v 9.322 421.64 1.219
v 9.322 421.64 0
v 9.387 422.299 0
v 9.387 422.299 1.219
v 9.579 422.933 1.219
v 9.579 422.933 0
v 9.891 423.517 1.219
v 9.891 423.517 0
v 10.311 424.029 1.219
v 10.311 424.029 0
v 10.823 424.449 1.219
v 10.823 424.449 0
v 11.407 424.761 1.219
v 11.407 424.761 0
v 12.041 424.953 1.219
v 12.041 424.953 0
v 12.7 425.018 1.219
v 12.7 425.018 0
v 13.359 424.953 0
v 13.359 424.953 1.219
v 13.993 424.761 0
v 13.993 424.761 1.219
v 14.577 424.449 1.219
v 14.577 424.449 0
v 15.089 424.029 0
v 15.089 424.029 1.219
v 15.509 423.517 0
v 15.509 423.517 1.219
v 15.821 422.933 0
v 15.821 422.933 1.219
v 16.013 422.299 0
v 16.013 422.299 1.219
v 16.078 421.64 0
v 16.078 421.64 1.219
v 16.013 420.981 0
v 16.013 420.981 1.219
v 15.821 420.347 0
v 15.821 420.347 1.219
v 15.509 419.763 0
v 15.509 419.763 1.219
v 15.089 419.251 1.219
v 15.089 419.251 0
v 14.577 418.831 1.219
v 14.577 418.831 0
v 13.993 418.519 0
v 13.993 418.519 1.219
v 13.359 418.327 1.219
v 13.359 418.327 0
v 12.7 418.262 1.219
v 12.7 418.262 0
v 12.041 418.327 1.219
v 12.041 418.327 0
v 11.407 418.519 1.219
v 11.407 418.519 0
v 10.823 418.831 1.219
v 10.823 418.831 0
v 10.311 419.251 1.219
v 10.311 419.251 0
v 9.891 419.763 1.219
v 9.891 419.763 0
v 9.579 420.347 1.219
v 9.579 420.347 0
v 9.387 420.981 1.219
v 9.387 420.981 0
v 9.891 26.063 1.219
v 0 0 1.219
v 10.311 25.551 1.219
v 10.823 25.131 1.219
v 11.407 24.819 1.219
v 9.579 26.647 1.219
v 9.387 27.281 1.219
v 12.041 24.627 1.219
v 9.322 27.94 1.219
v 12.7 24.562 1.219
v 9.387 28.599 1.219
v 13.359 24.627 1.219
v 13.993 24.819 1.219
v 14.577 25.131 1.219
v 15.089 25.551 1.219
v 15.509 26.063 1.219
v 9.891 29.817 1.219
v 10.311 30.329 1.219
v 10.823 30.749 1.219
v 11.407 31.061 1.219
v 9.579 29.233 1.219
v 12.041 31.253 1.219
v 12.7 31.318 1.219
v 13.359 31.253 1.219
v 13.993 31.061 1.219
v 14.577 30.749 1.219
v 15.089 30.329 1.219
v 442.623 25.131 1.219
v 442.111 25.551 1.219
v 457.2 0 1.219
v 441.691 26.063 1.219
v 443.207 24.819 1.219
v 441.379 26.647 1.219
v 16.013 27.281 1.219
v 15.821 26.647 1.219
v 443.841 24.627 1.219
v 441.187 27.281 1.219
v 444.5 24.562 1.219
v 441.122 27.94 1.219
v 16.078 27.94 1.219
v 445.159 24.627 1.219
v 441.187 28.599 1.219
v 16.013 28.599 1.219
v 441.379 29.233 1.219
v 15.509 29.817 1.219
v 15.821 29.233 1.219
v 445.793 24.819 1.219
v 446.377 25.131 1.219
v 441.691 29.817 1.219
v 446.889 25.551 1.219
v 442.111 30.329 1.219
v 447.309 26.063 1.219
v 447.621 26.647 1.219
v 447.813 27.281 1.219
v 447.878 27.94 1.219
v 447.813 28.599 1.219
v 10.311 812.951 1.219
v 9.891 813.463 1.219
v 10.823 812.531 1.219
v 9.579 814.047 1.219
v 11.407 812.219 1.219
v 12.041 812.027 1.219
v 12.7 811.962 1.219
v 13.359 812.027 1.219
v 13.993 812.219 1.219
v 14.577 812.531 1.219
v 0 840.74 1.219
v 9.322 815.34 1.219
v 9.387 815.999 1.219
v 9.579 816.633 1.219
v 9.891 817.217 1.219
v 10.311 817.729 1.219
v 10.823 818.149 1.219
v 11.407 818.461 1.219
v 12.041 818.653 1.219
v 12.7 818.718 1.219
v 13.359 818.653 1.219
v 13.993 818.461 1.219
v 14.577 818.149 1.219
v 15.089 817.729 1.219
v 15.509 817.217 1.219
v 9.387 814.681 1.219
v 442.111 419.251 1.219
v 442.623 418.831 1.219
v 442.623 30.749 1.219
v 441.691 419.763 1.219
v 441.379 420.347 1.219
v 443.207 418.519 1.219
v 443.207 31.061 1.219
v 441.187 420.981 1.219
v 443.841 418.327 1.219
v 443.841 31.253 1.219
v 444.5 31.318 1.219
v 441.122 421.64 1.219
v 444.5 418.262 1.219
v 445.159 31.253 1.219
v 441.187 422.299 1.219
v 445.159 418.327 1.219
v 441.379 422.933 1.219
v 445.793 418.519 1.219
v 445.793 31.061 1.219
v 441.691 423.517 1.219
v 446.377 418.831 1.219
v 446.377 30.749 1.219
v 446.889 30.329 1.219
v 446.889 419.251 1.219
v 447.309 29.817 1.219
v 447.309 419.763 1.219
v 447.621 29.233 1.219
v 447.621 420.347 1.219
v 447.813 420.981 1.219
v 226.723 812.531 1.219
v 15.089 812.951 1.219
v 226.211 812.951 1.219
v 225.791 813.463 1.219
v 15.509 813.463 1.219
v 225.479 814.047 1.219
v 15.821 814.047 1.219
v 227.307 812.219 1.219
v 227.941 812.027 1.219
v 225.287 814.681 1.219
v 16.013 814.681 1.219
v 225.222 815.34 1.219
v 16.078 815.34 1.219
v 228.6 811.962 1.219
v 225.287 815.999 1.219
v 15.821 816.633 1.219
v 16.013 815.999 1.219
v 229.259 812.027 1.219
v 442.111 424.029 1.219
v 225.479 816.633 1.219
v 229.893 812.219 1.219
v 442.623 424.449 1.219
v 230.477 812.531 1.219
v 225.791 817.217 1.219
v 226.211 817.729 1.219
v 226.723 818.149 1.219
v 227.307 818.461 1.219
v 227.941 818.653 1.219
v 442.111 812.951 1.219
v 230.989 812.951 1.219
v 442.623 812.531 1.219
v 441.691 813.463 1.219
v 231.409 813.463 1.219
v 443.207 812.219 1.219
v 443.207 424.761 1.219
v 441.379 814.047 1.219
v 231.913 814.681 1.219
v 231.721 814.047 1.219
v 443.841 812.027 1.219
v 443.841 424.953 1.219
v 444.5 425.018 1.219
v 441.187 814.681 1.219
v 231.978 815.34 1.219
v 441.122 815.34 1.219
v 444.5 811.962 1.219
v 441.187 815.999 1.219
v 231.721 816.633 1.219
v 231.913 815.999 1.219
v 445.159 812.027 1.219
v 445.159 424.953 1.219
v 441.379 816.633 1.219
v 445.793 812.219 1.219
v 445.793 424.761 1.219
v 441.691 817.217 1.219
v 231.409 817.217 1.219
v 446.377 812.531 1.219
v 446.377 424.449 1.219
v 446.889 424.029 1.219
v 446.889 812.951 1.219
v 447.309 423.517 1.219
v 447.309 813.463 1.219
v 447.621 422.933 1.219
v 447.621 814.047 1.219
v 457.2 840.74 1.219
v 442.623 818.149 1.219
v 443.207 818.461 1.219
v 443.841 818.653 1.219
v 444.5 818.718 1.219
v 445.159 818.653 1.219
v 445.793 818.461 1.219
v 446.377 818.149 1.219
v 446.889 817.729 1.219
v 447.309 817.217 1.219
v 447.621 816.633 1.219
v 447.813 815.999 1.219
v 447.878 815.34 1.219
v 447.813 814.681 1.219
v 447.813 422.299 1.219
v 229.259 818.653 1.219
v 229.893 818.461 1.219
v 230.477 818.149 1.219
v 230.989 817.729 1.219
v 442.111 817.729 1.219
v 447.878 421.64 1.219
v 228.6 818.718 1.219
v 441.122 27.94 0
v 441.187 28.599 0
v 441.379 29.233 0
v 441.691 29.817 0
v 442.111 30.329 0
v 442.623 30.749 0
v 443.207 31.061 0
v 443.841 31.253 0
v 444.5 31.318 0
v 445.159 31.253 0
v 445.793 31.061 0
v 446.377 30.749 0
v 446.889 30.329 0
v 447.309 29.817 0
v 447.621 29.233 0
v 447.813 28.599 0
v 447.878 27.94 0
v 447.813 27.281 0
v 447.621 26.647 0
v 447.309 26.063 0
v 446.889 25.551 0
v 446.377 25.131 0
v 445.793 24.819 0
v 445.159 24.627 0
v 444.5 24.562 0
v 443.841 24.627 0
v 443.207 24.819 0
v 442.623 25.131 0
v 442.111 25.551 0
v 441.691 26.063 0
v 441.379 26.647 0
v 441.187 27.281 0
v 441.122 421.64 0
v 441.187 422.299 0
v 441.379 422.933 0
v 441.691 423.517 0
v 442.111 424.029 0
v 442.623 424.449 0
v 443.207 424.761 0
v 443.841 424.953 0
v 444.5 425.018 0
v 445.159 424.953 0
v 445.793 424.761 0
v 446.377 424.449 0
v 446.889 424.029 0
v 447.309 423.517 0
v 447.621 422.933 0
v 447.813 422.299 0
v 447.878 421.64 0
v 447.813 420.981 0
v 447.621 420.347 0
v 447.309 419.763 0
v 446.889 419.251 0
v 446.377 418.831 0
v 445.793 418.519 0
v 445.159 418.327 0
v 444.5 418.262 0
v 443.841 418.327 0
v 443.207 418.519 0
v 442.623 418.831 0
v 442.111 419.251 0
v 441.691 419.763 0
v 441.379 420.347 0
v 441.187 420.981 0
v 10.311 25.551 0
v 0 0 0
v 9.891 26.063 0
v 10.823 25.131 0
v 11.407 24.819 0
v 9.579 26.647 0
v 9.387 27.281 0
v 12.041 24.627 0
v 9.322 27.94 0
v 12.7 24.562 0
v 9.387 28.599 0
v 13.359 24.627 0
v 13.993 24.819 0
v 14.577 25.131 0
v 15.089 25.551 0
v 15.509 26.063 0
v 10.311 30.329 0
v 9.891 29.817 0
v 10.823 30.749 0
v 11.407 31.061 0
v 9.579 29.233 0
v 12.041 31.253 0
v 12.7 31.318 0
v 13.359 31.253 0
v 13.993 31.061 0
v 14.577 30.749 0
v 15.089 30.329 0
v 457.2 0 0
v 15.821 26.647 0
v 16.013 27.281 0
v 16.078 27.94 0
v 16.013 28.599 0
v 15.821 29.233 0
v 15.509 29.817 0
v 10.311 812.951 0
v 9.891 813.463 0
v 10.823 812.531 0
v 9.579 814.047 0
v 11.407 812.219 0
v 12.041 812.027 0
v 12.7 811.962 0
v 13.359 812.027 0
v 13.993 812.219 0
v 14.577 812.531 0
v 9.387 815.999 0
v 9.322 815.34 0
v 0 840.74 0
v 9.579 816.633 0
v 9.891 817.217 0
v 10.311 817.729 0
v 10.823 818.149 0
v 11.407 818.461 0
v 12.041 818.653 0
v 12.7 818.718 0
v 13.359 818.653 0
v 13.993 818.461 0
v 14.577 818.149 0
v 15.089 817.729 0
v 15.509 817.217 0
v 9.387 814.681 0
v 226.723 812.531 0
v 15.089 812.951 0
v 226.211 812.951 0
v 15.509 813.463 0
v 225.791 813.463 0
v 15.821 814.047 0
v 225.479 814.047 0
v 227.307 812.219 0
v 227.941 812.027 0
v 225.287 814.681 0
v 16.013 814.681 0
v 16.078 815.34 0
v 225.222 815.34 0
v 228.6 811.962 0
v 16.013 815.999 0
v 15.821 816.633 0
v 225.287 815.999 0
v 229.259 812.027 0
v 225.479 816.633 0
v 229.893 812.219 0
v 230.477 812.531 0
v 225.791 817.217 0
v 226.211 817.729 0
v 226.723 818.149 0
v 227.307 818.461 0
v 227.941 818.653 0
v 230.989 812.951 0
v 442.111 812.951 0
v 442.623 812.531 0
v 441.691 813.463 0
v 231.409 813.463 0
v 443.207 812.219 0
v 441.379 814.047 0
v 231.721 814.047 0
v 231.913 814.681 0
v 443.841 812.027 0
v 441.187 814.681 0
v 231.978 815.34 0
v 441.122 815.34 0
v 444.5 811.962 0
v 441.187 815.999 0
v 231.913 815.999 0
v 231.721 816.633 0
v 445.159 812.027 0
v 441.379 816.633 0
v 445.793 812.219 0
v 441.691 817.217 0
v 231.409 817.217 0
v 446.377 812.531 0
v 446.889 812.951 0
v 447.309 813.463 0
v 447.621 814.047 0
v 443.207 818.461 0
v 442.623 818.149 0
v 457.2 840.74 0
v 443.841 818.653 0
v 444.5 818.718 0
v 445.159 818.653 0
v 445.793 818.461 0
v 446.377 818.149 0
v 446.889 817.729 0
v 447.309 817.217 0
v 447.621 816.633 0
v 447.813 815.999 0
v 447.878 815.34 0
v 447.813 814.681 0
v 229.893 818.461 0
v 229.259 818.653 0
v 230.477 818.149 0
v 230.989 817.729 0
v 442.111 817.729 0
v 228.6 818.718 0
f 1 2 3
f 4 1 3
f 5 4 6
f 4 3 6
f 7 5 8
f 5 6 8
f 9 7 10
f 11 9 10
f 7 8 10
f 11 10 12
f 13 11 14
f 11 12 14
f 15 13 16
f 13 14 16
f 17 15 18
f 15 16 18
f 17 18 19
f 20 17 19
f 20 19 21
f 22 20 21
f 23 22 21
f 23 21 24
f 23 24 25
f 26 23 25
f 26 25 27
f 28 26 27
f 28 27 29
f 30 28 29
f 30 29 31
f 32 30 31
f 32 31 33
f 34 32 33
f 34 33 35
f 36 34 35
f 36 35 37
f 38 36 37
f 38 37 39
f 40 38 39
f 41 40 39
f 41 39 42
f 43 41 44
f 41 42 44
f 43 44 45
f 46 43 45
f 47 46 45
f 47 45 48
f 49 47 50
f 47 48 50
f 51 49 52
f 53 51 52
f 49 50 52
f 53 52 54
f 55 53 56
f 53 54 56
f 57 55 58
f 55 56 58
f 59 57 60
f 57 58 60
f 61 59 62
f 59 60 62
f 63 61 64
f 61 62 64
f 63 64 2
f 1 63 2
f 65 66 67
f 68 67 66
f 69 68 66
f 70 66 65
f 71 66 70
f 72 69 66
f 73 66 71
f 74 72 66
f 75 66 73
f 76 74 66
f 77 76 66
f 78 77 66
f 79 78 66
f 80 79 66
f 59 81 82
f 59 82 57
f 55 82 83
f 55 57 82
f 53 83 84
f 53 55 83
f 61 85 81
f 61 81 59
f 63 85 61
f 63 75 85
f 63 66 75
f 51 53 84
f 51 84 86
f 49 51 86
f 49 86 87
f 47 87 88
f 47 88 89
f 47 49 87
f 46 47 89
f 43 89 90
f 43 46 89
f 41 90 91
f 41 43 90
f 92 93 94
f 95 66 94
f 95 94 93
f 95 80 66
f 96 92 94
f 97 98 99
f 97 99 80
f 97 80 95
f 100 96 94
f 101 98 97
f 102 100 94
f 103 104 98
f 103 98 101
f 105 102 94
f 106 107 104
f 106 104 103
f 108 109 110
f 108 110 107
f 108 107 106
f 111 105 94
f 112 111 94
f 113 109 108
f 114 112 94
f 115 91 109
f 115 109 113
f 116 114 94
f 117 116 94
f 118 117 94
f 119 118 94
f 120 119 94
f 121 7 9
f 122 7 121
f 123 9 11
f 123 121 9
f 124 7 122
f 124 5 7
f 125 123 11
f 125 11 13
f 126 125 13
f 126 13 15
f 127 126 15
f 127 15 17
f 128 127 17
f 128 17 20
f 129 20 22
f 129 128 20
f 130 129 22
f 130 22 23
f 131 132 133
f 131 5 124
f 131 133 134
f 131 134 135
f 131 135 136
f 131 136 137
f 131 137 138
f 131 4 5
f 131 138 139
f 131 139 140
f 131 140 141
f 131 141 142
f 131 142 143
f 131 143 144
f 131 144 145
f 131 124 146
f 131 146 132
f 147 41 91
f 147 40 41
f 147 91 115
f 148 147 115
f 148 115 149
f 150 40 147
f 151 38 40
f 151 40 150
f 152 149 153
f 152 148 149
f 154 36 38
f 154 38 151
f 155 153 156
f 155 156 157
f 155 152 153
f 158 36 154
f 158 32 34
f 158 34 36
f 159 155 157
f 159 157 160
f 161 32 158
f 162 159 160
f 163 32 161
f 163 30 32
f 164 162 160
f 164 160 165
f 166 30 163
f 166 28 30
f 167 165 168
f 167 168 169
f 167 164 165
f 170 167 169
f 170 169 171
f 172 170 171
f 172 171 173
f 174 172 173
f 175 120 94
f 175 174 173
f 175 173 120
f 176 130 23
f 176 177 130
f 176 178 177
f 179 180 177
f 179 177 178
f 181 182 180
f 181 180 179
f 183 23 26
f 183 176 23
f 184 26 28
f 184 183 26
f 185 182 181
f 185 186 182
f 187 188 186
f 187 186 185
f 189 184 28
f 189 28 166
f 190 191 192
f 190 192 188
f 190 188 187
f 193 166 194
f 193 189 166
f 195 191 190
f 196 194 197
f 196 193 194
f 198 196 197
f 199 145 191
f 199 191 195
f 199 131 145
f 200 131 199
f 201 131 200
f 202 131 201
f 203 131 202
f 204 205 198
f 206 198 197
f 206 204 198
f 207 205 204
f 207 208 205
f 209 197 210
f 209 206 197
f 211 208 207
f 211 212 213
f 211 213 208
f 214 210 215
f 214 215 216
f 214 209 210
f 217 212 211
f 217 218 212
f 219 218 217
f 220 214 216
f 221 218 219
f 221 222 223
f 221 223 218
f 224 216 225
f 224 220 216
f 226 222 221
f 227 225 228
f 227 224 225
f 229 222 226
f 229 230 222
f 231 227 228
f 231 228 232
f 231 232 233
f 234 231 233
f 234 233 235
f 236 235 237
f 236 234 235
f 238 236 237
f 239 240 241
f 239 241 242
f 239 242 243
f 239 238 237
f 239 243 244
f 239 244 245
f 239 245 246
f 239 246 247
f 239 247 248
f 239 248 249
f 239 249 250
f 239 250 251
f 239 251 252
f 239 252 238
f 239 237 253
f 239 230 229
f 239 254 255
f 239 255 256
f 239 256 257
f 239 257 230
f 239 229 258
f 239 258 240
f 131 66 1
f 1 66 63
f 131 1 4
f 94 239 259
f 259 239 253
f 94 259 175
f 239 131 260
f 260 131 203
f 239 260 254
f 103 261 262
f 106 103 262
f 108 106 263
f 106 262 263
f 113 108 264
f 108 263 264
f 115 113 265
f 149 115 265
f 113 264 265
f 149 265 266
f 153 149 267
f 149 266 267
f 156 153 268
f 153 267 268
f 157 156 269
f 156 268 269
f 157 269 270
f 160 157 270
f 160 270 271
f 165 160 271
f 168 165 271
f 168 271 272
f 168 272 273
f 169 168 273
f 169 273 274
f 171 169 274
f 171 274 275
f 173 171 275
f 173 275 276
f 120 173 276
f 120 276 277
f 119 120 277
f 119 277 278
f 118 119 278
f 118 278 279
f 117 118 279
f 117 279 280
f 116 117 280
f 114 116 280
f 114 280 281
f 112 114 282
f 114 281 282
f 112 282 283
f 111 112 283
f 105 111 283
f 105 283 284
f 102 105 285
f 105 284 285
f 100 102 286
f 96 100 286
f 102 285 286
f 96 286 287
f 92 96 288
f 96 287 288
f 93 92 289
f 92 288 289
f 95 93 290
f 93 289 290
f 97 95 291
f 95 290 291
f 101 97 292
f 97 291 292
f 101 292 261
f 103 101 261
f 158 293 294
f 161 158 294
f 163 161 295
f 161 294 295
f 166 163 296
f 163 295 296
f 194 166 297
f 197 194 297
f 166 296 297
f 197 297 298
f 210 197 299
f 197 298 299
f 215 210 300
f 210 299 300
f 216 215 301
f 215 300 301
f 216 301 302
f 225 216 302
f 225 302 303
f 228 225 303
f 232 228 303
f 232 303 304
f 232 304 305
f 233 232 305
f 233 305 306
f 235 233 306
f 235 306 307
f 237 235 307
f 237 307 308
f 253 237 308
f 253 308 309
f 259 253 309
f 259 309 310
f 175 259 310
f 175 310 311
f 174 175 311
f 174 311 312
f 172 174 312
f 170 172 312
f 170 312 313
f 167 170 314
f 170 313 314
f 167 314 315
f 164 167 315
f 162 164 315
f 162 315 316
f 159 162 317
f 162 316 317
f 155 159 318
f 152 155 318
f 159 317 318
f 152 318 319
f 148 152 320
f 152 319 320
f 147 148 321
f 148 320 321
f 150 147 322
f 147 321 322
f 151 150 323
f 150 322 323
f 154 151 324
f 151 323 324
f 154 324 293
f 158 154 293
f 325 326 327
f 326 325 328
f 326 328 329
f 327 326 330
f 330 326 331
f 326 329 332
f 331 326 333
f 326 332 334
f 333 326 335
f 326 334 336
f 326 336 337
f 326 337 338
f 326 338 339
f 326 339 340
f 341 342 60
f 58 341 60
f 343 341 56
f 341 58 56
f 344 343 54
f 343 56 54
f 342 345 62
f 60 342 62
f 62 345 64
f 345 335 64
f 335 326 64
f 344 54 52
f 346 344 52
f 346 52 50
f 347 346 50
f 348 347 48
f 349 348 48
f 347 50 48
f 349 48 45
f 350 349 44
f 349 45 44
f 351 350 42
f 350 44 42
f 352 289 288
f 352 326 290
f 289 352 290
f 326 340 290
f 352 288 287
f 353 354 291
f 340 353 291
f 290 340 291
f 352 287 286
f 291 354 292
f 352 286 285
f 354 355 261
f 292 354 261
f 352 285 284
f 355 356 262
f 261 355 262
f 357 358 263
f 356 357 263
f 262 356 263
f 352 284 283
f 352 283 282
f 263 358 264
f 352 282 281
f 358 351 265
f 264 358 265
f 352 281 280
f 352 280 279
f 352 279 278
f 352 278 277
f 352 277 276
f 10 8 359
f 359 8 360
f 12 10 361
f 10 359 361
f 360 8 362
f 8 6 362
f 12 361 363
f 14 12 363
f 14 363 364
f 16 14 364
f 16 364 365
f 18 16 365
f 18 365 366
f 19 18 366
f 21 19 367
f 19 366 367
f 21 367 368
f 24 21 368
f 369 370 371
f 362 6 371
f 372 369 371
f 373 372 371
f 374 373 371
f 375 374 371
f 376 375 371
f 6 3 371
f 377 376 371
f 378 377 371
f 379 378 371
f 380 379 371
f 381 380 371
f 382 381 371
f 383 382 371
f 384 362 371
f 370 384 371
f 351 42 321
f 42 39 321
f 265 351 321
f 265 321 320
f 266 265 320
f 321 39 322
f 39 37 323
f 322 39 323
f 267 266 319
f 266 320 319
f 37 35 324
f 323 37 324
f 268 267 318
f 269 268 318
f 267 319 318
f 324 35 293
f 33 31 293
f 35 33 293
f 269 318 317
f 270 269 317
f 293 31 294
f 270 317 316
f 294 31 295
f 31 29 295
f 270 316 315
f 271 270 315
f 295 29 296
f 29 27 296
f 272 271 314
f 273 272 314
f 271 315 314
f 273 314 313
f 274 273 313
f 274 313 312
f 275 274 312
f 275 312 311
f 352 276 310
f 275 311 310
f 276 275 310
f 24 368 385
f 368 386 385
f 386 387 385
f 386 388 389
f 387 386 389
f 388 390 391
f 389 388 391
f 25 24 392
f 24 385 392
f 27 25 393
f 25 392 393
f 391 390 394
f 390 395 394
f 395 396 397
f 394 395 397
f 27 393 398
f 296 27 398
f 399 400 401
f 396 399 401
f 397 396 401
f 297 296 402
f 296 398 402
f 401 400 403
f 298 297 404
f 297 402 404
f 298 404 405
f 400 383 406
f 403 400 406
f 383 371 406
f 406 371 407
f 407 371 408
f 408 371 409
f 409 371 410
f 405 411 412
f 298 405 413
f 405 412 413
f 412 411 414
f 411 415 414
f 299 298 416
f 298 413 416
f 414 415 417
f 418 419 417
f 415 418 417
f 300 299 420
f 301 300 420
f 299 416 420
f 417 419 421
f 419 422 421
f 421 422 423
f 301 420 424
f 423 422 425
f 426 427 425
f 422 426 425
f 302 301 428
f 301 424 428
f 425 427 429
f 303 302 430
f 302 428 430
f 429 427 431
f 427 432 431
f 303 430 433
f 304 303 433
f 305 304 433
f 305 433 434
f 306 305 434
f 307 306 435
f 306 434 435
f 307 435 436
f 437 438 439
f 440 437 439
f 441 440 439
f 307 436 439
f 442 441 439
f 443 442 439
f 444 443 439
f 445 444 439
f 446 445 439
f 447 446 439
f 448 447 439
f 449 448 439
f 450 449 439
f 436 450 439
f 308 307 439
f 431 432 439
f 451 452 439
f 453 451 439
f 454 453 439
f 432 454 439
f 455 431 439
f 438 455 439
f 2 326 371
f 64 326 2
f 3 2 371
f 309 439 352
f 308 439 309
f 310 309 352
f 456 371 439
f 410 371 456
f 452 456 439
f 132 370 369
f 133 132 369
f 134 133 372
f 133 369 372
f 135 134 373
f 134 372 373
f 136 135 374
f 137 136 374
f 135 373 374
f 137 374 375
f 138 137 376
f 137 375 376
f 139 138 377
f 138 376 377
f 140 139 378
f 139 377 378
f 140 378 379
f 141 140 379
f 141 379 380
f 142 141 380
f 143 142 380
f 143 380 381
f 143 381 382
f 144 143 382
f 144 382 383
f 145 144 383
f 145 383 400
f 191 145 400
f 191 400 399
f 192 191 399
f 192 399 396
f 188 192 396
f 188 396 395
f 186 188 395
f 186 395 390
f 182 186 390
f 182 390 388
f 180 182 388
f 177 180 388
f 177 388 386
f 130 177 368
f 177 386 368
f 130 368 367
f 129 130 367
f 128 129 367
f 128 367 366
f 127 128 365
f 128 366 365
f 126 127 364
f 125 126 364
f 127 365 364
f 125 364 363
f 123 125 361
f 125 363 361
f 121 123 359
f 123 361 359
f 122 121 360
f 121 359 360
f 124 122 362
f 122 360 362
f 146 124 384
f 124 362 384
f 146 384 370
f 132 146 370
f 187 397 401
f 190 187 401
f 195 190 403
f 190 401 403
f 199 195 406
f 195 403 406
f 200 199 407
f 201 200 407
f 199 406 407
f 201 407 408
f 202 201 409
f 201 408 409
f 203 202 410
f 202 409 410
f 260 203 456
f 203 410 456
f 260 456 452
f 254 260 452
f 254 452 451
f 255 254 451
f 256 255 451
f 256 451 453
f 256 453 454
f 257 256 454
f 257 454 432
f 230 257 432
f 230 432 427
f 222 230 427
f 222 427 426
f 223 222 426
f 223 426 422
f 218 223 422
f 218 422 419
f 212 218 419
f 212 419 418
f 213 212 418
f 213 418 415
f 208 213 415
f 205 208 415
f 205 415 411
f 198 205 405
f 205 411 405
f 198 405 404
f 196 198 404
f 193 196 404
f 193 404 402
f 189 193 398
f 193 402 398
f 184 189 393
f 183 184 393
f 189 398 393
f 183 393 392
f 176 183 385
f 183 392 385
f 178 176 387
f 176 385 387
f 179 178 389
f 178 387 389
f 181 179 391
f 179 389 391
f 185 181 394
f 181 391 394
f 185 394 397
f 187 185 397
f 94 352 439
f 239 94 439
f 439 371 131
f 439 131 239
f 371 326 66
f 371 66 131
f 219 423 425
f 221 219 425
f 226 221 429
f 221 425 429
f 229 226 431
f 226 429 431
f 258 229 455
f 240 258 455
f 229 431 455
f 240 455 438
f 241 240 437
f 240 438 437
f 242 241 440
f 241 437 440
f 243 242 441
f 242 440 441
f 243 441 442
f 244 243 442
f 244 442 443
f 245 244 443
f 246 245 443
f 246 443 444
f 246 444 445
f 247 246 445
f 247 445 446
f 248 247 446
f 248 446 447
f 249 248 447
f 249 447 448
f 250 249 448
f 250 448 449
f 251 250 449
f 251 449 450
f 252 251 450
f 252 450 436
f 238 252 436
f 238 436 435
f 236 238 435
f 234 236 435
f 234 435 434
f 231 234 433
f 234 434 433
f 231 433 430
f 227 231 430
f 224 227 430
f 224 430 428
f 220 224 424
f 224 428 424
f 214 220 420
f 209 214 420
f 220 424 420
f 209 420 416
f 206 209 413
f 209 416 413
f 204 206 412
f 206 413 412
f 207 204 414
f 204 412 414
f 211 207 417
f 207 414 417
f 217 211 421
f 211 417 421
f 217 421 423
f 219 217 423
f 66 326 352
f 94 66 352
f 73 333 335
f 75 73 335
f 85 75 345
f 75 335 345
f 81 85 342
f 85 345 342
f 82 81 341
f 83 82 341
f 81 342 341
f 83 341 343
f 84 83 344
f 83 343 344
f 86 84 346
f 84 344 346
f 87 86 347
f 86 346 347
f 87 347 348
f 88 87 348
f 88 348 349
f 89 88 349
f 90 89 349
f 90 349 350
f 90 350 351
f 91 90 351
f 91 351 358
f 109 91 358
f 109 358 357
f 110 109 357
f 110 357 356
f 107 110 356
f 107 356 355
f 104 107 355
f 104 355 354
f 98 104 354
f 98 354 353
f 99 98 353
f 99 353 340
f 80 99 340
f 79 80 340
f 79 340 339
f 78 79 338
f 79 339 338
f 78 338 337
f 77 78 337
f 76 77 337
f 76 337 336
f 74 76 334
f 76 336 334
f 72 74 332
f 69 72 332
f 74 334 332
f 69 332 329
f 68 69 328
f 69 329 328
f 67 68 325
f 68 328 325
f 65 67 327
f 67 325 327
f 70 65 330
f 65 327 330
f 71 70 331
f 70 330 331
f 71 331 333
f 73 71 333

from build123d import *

# Parameters (mm, degrees)
SKETCH1_W               = 457.2
SKETCH1_H               = 840.74
BOSS_EXTRUDE1_DEPTH     = 1.2192
F_1_4_CLEARANCE_HOLE1_D = 6.7564


with BuildPart() as part:
    # Sketch1 → Boss-Extrude1 (new body)
    with BuildSketch(Plane.XY):
        with Locations((228.6, 420.37)):
            Rectangle(SKETCH1_W, SKETCH1_H)
    extrude(amount=BOSS_EXTRUDE1_DEPTH)

    # 1/4 Clearance Hole1 (through all)
    with Locations(Plane.XY.offset(1.2192)):
        with Locations((12.7, 815.34), (228.6, 815.34), (444.5, 815.34), (444.5, 421.64), (12.7, 421.64), (12.7, 27.94), (444.5, 27.94)):
            Hole(F_1_4_CLEARANCE_HOLE1_D / 2)


solid = part.part
